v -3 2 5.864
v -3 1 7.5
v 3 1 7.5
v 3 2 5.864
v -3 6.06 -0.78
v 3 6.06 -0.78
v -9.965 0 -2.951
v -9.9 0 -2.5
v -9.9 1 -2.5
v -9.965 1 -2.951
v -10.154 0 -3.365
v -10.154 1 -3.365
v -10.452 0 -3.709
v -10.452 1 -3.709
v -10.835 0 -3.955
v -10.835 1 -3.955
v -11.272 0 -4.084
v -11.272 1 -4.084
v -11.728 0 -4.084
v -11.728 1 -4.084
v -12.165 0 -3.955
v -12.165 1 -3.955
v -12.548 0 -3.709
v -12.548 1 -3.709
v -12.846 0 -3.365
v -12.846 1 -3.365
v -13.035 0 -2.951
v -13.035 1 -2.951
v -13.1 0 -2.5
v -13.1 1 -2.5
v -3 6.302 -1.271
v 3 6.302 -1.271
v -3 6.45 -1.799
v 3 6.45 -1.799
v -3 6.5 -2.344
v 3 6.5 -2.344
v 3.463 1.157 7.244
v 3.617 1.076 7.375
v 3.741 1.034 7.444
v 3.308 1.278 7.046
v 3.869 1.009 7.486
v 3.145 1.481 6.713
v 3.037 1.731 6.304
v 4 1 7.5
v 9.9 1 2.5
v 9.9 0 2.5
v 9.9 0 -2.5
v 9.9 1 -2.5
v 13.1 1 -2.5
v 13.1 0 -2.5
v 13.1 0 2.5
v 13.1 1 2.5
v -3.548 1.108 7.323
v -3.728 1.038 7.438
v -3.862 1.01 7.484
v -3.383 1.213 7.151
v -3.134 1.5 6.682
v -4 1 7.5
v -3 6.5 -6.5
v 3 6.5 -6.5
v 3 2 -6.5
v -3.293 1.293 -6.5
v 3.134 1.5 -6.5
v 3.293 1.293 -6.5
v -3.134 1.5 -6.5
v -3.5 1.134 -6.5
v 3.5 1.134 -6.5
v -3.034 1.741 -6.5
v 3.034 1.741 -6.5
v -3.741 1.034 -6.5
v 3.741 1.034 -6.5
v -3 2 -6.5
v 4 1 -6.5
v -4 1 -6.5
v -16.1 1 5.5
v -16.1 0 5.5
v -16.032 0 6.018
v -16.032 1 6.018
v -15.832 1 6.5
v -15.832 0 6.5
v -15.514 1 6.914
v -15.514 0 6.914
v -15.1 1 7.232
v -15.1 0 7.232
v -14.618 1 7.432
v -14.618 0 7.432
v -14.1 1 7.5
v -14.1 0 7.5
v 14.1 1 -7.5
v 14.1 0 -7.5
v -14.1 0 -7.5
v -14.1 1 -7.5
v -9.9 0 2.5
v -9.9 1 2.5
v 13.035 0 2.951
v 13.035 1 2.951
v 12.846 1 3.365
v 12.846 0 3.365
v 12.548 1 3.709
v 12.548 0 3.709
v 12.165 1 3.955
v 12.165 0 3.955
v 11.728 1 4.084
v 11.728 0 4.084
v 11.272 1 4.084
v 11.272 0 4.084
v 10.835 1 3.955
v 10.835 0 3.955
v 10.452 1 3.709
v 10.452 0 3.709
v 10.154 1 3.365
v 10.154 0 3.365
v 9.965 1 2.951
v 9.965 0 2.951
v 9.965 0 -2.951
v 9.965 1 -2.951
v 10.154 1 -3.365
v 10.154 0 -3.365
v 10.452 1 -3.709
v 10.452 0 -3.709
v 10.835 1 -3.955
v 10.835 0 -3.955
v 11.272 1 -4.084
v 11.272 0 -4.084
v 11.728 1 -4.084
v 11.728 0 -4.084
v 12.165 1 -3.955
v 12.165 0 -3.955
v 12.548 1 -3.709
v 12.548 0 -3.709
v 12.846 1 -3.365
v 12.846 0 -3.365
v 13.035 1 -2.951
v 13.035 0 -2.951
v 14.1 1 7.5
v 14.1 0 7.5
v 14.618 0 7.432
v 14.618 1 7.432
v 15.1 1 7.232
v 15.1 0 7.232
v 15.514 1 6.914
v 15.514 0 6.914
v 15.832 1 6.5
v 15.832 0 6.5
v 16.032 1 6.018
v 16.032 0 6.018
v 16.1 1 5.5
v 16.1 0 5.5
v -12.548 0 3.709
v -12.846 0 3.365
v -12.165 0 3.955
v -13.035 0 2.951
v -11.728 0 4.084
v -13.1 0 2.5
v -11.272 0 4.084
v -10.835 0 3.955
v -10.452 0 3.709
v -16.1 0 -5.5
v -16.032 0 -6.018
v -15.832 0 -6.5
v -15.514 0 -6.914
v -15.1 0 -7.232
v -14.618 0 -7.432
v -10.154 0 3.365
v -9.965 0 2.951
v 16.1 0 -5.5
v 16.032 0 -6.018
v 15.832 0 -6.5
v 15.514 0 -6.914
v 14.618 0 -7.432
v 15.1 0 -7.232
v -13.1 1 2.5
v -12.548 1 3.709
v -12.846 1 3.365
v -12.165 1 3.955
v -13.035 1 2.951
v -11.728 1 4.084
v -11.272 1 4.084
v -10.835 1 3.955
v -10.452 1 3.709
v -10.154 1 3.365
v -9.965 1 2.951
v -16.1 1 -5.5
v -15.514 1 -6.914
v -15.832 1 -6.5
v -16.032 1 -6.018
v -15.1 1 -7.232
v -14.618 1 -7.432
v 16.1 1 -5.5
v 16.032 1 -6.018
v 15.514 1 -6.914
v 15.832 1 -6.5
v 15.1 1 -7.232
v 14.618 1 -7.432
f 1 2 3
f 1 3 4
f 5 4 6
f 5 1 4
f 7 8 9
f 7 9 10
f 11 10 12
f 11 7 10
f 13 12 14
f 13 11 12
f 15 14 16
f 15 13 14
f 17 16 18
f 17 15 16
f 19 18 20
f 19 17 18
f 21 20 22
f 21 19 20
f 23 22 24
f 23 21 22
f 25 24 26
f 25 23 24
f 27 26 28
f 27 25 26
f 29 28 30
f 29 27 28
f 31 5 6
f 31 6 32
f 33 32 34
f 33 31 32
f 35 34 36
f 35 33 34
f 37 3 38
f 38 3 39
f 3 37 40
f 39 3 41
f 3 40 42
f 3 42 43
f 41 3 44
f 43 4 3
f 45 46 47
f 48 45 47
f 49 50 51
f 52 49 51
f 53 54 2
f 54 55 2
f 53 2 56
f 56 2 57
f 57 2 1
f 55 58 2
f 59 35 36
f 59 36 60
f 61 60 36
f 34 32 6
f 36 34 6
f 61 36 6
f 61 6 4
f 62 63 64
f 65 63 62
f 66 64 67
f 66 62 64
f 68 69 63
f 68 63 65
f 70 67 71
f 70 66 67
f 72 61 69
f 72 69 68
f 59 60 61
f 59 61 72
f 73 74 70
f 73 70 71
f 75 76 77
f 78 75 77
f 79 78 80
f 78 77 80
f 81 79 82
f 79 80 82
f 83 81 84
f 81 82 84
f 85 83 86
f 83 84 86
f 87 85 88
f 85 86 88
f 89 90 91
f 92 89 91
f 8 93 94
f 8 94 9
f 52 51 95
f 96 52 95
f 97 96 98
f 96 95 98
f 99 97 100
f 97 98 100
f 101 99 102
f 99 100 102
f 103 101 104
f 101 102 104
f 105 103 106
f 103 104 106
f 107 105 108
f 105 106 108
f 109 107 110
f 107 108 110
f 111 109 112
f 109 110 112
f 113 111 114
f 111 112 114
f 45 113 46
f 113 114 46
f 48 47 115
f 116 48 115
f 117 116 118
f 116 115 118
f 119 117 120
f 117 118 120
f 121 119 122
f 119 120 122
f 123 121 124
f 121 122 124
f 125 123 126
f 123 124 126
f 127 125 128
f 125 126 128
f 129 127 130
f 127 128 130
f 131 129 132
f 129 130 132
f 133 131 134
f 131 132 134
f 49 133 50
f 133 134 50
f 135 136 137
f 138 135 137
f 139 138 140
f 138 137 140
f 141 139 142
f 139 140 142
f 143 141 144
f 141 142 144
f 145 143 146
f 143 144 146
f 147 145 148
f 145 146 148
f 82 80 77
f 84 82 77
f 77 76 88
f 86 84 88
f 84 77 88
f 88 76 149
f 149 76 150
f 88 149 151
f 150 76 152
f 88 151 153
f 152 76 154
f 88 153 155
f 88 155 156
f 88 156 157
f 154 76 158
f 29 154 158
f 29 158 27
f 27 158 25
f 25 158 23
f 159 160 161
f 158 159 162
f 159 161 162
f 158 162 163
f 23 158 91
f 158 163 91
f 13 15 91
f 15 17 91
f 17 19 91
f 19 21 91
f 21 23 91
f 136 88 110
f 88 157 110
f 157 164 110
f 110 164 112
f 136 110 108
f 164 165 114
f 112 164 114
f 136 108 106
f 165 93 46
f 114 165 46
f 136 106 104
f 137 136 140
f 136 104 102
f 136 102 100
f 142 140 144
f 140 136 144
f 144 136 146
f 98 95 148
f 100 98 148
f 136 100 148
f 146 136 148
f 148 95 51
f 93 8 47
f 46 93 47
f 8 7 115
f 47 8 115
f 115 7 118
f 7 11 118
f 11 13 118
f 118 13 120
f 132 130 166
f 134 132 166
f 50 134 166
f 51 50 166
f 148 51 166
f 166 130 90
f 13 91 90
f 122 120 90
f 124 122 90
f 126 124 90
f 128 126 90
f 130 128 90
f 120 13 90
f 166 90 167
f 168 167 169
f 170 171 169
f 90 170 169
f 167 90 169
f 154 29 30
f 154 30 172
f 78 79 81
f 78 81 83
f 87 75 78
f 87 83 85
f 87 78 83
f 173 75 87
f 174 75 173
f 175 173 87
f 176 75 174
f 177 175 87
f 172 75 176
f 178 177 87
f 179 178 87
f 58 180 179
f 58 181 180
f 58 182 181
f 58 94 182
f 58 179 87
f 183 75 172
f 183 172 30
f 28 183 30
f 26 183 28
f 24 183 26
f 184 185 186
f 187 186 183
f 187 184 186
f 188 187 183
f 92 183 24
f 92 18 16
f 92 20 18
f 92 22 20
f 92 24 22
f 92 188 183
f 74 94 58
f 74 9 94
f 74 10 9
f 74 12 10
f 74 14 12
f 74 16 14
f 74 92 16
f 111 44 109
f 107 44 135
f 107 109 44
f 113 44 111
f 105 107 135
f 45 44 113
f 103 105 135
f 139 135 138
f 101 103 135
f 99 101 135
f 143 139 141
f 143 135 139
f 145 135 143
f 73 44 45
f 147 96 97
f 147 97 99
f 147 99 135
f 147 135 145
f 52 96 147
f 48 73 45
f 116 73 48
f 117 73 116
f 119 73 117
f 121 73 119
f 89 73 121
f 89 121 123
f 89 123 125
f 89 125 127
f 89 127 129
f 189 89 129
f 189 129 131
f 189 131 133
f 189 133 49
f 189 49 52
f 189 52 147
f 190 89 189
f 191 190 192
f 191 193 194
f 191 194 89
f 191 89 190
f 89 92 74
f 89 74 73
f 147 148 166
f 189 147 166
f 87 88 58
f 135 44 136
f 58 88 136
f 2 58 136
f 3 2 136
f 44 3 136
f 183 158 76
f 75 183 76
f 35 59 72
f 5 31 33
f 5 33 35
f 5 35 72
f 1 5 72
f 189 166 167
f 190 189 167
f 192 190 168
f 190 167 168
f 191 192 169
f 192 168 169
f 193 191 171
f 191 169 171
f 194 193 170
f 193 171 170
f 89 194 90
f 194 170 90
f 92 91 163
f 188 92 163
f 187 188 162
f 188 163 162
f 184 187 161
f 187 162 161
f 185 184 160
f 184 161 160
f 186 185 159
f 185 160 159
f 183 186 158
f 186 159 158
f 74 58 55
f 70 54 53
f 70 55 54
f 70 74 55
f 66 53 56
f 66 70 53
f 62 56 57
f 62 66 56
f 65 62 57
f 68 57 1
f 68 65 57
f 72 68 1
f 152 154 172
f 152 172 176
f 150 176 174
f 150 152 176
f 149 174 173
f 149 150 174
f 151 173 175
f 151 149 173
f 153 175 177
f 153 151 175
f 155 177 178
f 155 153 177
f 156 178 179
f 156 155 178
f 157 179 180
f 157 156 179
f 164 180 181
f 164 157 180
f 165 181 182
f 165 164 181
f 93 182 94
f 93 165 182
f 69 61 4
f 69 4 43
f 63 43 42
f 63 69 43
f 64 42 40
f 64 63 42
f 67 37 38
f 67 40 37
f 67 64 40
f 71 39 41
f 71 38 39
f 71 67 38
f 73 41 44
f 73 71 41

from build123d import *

# Parameters (mm, degrees)
BOSS_EXTRUDE1_DEPTH      = 1
BOSS_EXTRUDE2_DEPTH      = 3
BOSS_EXTRUDE2_DEPTH_BACK = 3
FILLET1_R                = 1


with BuildPart() as part:
    # Sketch1 → Boss-Extrude1 (new body)
    with BuildSketch(Plane(origin=(0, 0, 0), x_dir=(1, 0, 0), z_dir=(0, 1, 0))):
        with BuildLine():
            Line((-14.1, -7.5), (14.1, -7.5))
            ThreePointArc((14.1, -7.5), (15.514213562, -6.914213562), (16.1, -5.5))
            Line((16.1, -5.5), (16.1, 5.5))
            ThreePointArc((16.1, 5.5), (15.514213562, 6.914213562), (14.1, 7.5))
            Line((14.1, 7.5), (-14.1, 7.5))
            ThreePointArc((-14.1, 7.5), (-15.514213562, 6.914213562), (-16.1, 5.5))
            Line((-16.1, 5.5), (-16.1, -5.5))
            ThreePointArc((-16.1, -5.5), (-15.514213562, -6.914213562), (-14.1, -7.5))
        make_face()
        with BuildLine():
            Line((9.9, -2.5), (9.9, 2.5))
            ThreePointArc((9.9, 2.5), (11.5, 4.1), (13.1, 2.5))
            Line((13.1, 2.5), (13.1, -2.5))
            ThreePointArc((13.1, -2.5), (11.5, -4.1), (9.9, -2.5))
        make_face(mode=Mode.SUBTRACT)
        with BuildLine():
            Line((-9.9, -2.5), (-9.9, 2.5))
            ThreePointArc((-9.9, 2.5), (-11.5, 4.1), (-13.1, 2.5))
            Line((-13.1, 2.5), (-13.1, -2.5))
            ThreePointArc((-13.1, -2.5), (-11.5, -4.1), (-9.9, -2.5))
        make_face(mode=Mode.SUBTRACT)
    extrude(amount=BOSS_EXTRUDE1_DEPTH)

    # Sketch2 → Boss-Extrude2 (add, two sides: drawn at the far end of the back side and taken through both)
    with BuildSketch(Plane(origin=(0, 0, 0), x_dir=(0, 0, -1), z_dir=(1, 0, 0)).offset(-BOSS_EXTRUDE2_DEPTH_BACK)):
        with BuildLine():
            Line((6.5, 6.5), (6.5, 1))
            Line((6.5, 1), (-7.5, 1))
            Line((-7.5, 1), (0.779747183, 6.059845501))
            ThreePointArc((0.779747183, 6.059845501), (1.531550752, 6.387865691), (2.344097212, 6.5))
            Line((2.344097212, 6.5), (6.5, 6.5))
        make_face()
    extrude(amount=BOSS_EXTRUDE2_DEPTH + BOSS_EXTRUDE2_DEPTH_BACK)

    # Fillet1
    # the kernel refuses this fillet: 1 mm, written as the material it adds along each edge
    with BuildSketch(Plane(origin=(-3, 1, -6.5), x_dir=(-1, 0, 0), z_dir=(0, 0, 1))) as fillet1_piece_1_section:
        with BuildLine():
            CenterArc((FILLET1_R, -FILLET1_R), FILLET1_R, 90, 90)
            Line((0, -FILLET1_R), (0, 0))
            Line((0, 0), (FILLET1_R, 0))
        make_face()
    fillet1_piece_1 = extrude(amount=14, mode=Mode.PRIVATE)
    fillet1_piece_1 = split(fillet1_piece_1, bisect_by=Plane(origin=(-3.229666566, 4.255348718, 2.173065734), z_dir=(0, -0.8532818336519591, -0.5214500094539749)), keep=Keep.TOP, mode=Mode.PRIVATE)
    add(fillet1_piece_1)
    with BuildSketch(Plane(origin=(3, 1, -6.5), x_dir=(1, 0, 0), z_dir=(0, 0, 1))) as fillet1_piece_2_section:
        with BuildLine():
            CenterArc((FILLET1_R, FILLET1_R), FILLET1_R, 180, 90)
            Line((0, FILLET1_R), (0, 0))
            Line((0, 0), (FILLET1_R, 0))
        make_face()
    fillet1_piece_2 = extrude(amount=14, mode=Mode.PRIVATE)
    fillet1_piece_2 = split(fillet1_piece_2, bisect_by=Plane(origin=(3.229666566, 4.255348718, 2.173065734), z_dir=(0, -0.8532818336519591, -0.5214500094539749)), keep=Keep.TOP, mode=Mode.PRIVATE)
    add(fillet1_piece_2)


solid = part.part
